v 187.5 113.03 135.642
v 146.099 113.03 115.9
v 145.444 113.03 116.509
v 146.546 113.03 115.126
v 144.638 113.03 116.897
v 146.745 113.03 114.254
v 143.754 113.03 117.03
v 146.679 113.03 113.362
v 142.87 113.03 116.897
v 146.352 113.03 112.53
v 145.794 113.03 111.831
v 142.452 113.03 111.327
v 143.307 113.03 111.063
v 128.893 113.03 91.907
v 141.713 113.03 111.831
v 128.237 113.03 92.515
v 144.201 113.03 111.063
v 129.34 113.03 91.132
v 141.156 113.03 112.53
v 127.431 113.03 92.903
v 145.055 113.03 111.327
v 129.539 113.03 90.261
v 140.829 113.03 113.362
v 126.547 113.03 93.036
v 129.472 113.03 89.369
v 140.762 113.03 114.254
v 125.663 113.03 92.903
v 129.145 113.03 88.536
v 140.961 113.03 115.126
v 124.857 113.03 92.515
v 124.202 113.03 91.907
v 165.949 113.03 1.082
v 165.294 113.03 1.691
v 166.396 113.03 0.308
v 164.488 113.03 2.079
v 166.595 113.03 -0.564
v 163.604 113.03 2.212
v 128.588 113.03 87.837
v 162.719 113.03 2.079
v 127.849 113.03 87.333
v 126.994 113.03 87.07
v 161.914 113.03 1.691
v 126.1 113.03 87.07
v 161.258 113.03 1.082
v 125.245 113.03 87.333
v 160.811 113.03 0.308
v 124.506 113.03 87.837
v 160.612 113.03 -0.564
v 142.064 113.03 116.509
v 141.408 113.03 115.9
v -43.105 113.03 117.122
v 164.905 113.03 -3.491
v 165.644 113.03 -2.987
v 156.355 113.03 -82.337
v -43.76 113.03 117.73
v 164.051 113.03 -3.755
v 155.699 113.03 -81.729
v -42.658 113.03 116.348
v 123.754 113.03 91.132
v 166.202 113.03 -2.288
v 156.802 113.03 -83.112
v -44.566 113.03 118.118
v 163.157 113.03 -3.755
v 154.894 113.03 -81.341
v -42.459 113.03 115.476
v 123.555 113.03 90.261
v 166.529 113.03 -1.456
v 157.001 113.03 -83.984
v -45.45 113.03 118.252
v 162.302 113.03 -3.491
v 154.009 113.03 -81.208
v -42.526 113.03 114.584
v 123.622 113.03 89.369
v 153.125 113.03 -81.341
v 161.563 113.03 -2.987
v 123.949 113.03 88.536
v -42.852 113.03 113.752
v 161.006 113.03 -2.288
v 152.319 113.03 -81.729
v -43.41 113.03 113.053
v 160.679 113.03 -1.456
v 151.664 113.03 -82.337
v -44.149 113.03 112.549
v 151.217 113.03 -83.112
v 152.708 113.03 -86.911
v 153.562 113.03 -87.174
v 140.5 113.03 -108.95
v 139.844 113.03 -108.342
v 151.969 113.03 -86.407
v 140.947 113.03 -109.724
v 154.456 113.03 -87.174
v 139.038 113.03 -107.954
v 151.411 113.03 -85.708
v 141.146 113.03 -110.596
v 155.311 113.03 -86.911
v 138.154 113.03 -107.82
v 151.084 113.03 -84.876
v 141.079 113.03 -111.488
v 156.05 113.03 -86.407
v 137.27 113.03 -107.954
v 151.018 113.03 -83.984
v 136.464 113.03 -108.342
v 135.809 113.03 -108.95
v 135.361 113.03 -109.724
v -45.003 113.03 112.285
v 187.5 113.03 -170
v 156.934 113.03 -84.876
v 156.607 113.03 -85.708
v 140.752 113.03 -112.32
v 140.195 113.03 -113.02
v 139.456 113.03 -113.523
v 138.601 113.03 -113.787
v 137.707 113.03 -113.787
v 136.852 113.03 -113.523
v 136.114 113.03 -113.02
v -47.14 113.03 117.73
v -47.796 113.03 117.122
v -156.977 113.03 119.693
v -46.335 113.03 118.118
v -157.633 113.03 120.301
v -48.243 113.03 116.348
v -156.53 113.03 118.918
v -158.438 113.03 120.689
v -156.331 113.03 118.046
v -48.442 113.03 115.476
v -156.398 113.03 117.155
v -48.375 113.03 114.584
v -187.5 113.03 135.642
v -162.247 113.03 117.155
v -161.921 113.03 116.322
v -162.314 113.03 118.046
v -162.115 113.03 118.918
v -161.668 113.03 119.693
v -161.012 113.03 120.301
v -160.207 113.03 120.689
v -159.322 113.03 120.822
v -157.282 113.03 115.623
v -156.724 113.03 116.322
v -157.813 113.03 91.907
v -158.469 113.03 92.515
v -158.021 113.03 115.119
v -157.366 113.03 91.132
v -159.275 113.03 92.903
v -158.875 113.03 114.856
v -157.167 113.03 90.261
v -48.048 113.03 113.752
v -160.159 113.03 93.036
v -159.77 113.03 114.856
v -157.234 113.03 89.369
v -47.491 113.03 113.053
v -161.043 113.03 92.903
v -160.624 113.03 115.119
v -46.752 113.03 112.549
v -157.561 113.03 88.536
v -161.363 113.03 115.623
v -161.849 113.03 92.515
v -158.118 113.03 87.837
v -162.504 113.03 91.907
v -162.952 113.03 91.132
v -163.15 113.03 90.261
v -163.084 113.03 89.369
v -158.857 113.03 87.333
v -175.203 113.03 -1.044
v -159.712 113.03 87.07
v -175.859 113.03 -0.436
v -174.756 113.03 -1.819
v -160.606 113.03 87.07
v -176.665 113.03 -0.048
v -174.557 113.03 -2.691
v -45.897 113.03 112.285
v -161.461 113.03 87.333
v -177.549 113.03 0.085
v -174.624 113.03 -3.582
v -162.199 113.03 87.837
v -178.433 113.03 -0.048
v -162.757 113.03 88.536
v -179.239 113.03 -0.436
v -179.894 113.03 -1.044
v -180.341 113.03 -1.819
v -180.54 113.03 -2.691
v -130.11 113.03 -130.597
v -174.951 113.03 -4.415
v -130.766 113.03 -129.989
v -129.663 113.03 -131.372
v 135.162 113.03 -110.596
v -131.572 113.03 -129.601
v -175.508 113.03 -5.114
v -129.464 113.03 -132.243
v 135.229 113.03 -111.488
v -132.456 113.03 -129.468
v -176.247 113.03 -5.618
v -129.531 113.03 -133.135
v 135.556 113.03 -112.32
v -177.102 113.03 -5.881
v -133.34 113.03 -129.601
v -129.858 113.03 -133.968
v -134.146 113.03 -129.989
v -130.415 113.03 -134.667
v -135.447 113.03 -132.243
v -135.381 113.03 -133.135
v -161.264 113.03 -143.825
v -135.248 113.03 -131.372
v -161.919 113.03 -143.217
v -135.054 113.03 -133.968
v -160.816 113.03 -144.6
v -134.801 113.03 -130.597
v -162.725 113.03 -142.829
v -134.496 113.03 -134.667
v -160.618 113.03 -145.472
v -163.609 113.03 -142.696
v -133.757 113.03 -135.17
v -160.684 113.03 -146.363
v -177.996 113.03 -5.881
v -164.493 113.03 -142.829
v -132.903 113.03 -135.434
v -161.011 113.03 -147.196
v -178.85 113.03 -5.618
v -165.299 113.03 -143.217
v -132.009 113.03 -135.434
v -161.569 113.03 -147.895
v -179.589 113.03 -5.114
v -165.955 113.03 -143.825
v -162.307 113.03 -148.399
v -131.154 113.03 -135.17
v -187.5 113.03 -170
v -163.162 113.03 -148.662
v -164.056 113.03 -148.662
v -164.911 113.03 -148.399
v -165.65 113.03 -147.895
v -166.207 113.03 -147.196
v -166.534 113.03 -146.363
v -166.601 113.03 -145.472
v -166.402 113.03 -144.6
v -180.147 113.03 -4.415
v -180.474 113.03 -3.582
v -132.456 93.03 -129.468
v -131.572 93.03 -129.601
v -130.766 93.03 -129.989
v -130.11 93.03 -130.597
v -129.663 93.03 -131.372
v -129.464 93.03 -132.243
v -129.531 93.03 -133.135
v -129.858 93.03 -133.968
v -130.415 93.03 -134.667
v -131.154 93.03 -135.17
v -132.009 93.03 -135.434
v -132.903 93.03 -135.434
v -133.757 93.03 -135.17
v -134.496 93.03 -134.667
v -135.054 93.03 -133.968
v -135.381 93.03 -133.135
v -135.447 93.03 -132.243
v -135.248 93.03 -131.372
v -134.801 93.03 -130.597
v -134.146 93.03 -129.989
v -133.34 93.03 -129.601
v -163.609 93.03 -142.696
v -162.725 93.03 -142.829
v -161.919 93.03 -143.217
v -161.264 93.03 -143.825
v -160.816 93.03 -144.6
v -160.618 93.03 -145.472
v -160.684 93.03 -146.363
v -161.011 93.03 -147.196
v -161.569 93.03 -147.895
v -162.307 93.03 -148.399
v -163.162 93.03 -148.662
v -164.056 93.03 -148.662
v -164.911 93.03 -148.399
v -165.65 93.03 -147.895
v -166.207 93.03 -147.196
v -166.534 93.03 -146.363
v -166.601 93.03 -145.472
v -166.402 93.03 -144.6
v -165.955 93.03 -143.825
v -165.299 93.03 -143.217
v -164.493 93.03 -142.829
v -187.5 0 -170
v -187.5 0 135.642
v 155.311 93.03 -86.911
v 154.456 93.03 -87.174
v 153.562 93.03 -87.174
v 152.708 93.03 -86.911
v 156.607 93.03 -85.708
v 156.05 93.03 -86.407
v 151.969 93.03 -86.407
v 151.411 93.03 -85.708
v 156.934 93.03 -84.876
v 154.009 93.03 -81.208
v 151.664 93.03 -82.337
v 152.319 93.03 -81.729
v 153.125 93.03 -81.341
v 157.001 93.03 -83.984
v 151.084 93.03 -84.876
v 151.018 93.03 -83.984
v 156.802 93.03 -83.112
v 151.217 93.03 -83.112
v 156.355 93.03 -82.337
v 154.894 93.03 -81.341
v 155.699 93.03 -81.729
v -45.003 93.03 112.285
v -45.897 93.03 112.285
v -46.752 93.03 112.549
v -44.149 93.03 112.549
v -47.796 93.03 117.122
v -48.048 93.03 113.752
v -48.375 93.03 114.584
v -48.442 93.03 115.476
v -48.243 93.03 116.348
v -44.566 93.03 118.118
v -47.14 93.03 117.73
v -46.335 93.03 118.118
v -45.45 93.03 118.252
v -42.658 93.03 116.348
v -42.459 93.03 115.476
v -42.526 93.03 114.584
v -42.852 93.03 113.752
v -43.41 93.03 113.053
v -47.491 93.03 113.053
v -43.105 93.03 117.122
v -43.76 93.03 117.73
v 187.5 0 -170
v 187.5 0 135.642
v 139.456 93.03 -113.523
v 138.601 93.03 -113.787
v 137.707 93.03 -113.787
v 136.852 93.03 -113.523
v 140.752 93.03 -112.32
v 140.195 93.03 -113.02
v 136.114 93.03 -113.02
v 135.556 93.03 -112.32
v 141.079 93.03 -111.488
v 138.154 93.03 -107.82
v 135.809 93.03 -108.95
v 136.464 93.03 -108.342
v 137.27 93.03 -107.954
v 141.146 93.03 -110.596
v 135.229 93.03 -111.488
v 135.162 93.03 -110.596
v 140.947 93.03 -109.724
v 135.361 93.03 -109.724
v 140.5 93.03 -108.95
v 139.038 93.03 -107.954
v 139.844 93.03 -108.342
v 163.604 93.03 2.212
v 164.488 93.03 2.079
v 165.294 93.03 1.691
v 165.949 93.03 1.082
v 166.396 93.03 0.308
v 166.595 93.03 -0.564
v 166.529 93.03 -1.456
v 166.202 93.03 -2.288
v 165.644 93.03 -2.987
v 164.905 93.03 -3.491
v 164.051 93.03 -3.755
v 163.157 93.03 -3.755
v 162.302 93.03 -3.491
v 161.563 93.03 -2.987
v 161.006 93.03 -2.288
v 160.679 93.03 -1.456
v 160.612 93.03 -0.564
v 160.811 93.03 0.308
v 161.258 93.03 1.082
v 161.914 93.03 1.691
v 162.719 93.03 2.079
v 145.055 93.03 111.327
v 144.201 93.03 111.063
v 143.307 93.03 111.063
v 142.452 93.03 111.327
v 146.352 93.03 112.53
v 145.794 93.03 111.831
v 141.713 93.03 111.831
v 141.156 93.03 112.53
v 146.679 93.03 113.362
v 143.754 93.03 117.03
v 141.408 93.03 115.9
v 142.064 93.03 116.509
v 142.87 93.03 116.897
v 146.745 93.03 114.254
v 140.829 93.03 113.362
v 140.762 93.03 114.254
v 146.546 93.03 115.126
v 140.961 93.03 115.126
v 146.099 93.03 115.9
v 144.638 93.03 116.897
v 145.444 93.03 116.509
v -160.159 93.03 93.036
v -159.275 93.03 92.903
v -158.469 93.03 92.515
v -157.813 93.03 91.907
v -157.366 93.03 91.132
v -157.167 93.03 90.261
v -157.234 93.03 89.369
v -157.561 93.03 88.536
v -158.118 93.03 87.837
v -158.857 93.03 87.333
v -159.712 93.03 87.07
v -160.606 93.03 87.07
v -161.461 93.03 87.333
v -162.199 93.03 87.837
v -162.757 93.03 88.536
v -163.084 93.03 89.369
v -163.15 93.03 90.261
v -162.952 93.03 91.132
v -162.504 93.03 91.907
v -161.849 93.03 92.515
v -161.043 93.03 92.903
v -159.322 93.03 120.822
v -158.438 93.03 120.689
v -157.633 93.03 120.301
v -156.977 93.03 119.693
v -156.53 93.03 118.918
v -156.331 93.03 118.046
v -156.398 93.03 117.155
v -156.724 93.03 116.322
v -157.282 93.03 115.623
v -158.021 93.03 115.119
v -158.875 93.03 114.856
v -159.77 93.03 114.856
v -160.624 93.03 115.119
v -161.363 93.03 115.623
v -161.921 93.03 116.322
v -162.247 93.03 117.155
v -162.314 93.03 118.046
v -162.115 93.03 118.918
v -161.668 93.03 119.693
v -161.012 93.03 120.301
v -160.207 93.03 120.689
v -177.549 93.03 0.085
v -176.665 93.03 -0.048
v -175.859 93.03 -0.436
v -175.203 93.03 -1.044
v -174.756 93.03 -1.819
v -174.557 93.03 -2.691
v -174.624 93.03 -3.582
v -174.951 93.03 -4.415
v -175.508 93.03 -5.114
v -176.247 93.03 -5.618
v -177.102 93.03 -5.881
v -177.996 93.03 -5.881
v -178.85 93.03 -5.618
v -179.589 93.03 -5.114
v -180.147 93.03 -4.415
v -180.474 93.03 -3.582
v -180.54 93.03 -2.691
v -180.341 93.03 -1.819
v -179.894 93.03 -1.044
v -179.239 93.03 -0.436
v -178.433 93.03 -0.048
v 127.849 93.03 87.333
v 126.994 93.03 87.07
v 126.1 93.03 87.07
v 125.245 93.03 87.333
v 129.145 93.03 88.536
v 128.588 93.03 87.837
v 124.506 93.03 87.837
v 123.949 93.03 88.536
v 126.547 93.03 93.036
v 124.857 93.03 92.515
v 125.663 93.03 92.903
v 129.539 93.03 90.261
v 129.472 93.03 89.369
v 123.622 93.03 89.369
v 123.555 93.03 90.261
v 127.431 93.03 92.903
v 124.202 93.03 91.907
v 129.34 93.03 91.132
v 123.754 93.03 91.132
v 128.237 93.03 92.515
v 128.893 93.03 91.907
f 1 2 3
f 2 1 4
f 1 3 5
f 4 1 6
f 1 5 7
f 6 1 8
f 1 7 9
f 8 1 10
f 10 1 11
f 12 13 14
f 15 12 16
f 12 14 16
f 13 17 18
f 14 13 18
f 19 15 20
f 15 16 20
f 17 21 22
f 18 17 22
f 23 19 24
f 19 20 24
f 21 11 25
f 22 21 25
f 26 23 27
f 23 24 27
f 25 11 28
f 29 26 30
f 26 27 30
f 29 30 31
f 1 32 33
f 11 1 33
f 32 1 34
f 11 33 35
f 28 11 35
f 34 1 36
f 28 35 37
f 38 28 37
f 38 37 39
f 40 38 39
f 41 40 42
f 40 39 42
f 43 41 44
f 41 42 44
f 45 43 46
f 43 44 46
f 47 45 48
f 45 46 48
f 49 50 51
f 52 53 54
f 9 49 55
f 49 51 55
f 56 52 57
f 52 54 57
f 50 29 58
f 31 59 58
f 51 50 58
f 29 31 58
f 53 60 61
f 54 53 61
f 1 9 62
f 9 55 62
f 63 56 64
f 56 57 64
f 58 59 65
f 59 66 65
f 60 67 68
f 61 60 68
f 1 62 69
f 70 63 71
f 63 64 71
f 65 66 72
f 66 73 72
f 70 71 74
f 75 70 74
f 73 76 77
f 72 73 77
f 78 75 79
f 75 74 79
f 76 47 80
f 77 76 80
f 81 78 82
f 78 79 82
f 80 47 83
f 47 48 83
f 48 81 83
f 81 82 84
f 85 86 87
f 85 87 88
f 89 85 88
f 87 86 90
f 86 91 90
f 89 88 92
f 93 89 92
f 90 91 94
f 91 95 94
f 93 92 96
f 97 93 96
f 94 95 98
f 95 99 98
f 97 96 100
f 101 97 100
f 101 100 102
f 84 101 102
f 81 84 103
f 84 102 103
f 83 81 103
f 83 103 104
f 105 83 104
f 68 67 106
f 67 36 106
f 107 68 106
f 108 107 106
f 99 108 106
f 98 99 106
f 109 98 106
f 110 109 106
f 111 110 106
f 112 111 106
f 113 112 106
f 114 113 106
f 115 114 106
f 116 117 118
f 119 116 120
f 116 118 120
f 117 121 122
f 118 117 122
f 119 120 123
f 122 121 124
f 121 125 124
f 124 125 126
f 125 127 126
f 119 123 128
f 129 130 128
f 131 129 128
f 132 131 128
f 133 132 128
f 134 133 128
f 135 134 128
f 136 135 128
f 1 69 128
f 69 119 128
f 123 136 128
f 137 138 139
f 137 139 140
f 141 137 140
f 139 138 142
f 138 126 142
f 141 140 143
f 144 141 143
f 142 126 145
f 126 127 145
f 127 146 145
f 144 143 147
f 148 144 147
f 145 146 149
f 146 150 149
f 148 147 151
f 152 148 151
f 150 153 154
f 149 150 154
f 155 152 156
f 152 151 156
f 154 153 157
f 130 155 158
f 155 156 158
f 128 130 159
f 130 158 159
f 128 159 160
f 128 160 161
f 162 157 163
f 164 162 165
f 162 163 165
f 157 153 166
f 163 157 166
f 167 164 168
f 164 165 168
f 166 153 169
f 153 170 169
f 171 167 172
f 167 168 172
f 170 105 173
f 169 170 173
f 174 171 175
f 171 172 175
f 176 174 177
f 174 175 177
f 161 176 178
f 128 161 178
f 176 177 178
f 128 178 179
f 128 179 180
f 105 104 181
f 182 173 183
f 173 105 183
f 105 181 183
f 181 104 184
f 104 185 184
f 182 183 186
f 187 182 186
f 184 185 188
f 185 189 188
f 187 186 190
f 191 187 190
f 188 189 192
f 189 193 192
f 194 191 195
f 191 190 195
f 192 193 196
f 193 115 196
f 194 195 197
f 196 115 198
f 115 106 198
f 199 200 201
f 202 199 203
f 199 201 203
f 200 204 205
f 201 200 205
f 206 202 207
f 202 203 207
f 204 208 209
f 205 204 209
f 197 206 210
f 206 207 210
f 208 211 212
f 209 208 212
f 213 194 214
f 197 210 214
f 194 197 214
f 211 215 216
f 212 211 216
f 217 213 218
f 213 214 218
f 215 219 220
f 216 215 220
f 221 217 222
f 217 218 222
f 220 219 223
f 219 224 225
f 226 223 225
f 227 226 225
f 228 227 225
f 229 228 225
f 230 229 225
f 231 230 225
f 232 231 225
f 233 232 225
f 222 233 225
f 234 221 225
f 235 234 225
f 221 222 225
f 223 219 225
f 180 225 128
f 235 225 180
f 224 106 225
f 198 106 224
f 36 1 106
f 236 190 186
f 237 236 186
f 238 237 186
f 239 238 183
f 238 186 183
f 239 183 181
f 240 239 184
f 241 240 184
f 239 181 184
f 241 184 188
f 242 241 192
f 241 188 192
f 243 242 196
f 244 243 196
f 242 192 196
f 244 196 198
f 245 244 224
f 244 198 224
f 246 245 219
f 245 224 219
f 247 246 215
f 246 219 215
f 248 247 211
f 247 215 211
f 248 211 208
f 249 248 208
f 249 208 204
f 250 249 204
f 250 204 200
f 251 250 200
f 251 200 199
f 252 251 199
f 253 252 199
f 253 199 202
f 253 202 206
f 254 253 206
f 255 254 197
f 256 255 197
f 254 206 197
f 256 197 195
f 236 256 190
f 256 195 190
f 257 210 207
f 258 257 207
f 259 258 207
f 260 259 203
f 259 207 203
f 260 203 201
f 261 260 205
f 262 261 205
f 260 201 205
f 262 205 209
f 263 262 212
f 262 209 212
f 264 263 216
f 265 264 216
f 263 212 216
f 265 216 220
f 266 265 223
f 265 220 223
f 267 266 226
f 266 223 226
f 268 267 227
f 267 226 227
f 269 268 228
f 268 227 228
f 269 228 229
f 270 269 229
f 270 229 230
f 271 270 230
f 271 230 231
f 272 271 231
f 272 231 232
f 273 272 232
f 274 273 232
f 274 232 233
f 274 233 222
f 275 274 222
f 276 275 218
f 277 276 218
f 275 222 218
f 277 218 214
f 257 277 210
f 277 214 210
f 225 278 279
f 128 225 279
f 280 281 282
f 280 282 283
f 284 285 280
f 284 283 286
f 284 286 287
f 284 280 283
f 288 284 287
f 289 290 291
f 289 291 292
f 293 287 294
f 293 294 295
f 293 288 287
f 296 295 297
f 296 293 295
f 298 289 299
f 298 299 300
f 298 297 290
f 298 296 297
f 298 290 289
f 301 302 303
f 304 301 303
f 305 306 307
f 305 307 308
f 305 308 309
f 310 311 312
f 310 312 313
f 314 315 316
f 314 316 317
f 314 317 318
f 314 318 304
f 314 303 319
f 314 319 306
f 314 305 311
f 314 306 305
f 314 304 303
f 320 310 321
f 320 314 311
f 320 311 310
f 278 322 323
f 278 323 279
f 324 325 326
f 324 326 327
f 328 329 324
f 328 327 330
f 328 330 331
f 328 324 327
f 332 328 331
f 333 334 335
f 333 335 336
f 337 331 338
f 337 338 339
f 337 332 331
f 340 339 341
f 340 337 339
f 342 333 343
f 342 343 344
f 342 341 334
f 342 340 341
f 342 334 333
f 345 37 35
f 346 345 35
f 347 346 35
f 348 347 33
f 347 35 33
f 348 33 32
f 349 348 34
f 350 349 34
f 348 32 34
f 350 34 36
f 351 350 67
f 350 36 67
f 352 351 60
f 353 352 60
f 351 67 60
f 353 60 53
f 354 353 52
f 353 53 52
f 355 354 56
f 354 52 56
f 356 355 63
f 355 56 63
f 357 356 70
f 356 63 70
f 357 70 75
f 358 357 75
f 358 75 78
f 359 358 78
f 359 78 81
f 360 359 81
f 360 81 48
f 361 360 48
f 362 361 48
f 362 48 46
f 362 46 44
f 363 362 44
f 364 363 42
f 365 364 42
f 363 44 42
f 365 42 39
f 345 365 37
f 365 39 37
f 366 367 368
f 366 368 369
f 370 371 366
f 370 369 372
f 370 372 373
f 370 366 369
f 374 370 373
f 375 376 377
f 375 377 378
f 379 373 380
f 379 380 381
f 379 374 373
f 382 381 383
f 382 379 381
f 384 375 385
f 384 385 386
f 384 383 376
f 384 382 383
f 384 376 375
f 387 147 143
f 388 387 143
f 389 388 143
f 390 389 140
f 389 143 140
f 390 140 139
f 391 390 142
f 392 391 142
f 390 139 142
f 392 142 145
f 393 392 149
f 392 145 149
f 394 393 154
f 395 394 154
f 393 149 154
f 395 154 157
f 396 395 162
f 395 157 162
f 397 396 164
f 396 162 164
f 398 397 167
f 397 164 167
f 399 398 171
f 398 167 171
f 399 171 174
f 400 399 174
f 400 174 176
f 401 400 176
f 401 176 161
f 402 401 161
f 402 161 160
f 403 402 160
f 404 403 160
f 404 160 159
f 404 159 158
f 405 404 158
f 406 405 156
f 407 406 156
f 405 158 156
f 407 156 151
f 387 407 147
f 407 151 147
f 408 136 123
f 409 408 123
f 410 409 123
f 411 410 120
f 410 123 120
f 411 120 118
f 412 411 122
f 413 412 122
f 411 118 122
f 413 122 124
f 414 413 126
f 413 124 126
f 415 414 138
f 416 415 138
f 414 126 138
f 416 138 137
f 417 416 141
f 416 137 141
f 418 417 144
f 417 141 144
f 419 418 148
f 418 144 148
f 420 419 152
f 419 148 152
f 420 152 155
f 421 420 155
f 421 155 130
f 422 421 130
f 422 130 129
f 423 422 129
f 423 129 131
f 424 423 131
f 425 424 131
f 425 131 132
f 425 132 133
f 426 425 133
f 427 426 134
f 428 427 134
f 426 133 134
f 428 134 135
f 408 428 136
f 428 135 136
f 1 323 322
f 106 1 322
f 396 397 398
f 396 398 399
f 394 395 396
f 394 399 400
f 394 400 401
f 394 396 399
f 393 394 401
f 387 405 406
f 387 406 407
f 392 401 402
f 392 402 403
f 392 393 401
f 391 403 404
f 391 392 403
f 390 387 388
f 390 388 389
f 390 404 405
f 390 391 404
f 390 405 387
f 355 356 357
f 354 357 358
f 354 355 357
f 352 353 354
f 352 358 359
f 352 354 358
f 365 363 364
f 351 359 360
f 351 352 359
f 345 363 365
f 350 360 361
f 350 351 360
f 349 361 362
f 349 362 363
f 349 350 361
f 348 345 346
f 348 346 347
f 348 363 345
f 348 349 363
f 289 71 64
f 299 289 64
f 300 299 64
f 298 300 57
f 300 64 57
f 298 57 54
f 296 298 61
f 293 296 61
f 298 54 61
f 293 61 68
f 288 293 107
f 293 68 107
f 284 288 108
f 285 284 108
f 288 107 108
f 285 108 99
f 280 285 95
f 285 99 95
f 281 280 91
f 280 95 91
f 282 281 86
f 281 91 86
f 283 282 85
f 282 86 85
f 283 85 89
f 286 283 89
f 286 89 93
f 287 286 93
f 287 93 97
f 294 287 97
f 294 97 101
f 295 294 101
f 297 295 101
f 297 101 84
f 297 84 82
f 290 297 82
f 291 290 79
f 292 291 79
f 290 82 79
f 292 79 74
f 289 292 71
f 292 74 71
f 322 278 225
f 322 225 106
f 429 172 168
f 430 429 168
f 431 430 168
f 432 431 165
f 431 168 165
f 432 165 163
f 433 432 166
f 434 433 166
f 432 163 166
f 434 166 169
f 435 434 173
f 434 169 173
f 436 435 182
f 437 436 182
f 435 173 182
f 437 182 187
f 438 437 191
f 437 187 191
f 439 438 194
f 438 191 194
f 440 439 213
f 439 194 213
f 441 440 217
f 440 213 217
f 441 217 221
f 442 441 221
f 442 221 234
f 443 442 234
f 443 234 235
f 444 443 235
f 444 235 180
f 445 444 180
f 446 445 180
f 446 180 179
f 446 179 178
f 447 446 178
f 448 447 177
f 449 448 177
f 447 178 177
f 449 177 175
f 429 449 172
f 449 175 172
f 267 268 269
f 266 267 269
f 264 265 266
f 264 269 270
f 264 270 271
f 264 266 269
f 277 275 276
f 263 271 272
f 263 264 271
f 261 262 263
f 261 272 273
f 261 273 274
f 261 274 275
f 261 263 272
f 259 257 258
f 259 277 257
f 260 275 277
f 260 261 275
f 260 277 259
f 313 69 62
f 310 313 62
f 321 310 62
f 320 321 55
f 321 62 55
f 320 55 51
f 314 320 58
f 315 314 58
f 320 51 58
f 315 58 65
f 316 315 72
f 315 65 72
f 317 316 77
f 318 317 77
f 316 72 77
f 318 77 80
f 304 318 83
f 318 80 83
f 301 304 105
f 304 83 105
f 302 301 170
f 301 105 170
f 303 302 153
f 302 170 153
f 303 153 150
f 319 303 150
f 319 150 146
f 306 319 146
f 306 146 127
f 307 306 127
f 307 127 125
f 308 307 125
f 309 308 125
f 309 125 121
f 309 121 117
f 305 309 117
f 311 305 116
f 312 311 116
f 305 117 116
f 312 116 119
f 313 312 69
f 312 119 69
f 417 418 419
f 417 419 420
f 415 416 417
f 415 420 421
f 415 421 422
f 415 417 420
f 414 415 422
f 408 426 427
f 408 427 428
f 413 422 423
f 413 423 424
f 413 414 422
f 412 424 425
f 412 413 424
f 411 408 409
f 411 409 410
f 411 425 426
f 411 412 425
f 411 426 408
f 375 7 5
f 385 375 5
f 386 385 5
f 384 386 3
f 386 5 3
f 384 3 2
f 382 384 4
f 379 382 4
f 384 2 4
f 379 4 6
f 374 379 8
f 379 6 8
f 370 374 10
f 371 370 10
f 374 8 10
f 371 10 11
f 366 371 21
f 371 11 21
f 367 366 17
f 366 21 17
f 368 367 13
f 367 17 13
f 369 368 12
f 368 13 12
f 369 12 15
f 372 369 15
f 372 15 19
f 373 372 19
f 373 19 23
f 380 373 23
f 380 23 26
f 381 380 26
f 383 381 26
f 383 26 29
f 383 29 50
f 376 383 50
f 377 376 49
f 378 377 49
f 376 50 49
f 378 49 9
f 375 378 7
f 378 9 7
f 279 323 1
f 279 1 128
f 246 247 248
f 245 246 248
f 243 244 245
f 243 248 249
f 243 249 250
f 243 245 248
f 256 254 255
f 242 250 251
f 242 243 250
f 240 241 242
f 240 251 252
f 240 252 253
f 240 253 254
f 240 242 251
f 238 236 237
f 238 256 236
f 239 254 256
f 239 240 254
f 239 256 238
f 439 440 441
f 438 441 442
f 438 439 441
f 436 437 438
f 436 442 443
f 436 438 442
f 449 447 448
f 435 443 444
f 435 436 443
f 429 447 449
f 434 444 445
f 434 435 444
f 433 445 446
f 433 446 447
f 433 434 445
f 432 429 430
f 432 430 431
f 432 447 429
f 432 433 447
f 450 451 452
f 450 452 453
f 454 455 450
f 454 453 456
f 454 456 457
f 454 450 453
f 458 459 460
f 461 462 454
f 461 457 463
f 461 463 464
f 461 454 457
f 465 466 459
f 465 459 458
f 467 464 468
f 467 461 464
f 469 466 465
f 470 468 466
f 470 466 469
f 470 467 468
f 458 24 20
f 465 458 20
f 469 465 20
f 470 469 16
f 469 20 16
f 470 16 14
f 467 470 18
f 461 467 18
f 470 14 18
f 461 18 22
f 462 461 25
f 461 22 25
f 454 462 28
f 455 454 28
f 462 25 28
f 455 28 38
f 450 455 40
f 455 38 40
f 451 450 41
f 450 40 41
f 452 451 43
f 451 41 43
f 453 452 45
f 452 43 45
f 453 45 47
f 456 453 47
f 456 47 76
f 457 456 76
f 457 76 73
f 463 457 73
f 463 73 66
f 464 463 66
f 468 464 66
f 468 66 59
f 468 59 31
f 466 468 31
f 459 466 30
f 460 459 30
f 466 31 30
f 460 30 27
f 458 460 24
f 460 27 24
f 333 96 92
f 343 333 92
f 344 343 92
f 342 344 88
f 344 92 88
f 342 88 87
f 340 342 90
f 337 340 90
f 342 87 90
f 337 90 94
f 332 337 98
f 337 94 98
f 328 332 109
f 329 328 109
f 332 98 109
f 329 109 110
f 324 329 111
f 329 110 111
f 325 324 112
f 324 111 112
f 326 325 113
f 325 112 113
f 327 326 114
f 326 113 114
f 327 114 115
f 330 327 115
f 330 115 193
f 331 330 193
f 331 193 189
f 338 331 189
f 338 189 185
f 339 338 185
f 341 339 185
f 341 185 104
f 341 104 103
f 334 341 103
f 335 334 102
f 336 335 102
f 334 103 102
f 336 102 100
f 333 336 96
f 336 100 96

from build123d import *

# Parameters (mm, degrees)
BOSS_EXTRUDE1_DEPTH = 113.03
A_ARM_SKETCHES_R    = 3
A_ARM_HOLES_DEPTH   = 20


with BuildPart() as part:
    # Sketch1 → Boss-Extrude1 (new body)
    with BuildSketch(Plane(origin=(0, 0, 0), x_dir=(1, 0, 0), z_dir=(0, 1, 0))):
        Polygon((-187.5, 150), (-187.5, 170), (187.5, 170), (187.5, 152.769842226), (187.5, -135.642424533), (-187.5, -135.642424533), align=None)
    extrude(amount=BOSS_EXTRUDE1_DEPTH)

    # A-ARM SKETCHES → A-ARM HOLES (cut)
    with BuildSketch(Plane(origin=(0, 113.03, 0), x_dir=(1, 0, 0), z_dir=(0, 1, 0))):
        with Locations(Location((-163.609115423, 145.695818662, 0), (0, 0, 270))):
            Circle(A_ARM_SKETCHES_R)
        with Locations(Location((-132.455839765, 132.467571365, 0), (0, 0, 270))):
            Circle(A_ARM_SKETCHES_R)
        with Locations(Location((-177.54881427, 2.914785745, 0), (0, 0, 270))):
            Circle(A_ARM_SKETCHES_R)
        with Locations(Location((-160.15888427, -90.036396379, 0), (0, 0, 270))):
            Circle(A_ARM_SKETCHES_R)
        with Locations(Location((-159.322465718, -117.822298669, 0), (0, 0, 270))):
            Circle(A_ARM_SKETCHES_R)
        with Locations(Location((-45.450372331, -115.251672549, 0), (0, 0, 270))):
            Circle(A_ARM_SKETCHES_R)
        with Locations(Location((143.753799676, -114.029801923, 0), (0, 0, 270))):
            Circle(A_ARM_SKETCHES_R)
        with Locations(Location((126.54701573, -90.036396379, 0), (0, 0, 270))):
            Circle(A_ARM_SKETCHES_R)
        with Locations(Location((163.603739253, 0.788099457, 0), (0, 0, 270))):
            Circle(A_ARM_SKETCHES_R)
        with Locations(Location((154.009247845, 84.207947628, 0), (0, 0, 270))):
            Circle(A_ARM_SKETCHES_R)
        with Locations(Location((138.154047489, 110.820373833, 0), (0, 0, 270))):
            Circle(A_ARM_SKETCHES_R)
    extrude(amount=-A_ARM_HOLES_DEPTH, mode=Mode.SUBTRACT)


solid = part.part
